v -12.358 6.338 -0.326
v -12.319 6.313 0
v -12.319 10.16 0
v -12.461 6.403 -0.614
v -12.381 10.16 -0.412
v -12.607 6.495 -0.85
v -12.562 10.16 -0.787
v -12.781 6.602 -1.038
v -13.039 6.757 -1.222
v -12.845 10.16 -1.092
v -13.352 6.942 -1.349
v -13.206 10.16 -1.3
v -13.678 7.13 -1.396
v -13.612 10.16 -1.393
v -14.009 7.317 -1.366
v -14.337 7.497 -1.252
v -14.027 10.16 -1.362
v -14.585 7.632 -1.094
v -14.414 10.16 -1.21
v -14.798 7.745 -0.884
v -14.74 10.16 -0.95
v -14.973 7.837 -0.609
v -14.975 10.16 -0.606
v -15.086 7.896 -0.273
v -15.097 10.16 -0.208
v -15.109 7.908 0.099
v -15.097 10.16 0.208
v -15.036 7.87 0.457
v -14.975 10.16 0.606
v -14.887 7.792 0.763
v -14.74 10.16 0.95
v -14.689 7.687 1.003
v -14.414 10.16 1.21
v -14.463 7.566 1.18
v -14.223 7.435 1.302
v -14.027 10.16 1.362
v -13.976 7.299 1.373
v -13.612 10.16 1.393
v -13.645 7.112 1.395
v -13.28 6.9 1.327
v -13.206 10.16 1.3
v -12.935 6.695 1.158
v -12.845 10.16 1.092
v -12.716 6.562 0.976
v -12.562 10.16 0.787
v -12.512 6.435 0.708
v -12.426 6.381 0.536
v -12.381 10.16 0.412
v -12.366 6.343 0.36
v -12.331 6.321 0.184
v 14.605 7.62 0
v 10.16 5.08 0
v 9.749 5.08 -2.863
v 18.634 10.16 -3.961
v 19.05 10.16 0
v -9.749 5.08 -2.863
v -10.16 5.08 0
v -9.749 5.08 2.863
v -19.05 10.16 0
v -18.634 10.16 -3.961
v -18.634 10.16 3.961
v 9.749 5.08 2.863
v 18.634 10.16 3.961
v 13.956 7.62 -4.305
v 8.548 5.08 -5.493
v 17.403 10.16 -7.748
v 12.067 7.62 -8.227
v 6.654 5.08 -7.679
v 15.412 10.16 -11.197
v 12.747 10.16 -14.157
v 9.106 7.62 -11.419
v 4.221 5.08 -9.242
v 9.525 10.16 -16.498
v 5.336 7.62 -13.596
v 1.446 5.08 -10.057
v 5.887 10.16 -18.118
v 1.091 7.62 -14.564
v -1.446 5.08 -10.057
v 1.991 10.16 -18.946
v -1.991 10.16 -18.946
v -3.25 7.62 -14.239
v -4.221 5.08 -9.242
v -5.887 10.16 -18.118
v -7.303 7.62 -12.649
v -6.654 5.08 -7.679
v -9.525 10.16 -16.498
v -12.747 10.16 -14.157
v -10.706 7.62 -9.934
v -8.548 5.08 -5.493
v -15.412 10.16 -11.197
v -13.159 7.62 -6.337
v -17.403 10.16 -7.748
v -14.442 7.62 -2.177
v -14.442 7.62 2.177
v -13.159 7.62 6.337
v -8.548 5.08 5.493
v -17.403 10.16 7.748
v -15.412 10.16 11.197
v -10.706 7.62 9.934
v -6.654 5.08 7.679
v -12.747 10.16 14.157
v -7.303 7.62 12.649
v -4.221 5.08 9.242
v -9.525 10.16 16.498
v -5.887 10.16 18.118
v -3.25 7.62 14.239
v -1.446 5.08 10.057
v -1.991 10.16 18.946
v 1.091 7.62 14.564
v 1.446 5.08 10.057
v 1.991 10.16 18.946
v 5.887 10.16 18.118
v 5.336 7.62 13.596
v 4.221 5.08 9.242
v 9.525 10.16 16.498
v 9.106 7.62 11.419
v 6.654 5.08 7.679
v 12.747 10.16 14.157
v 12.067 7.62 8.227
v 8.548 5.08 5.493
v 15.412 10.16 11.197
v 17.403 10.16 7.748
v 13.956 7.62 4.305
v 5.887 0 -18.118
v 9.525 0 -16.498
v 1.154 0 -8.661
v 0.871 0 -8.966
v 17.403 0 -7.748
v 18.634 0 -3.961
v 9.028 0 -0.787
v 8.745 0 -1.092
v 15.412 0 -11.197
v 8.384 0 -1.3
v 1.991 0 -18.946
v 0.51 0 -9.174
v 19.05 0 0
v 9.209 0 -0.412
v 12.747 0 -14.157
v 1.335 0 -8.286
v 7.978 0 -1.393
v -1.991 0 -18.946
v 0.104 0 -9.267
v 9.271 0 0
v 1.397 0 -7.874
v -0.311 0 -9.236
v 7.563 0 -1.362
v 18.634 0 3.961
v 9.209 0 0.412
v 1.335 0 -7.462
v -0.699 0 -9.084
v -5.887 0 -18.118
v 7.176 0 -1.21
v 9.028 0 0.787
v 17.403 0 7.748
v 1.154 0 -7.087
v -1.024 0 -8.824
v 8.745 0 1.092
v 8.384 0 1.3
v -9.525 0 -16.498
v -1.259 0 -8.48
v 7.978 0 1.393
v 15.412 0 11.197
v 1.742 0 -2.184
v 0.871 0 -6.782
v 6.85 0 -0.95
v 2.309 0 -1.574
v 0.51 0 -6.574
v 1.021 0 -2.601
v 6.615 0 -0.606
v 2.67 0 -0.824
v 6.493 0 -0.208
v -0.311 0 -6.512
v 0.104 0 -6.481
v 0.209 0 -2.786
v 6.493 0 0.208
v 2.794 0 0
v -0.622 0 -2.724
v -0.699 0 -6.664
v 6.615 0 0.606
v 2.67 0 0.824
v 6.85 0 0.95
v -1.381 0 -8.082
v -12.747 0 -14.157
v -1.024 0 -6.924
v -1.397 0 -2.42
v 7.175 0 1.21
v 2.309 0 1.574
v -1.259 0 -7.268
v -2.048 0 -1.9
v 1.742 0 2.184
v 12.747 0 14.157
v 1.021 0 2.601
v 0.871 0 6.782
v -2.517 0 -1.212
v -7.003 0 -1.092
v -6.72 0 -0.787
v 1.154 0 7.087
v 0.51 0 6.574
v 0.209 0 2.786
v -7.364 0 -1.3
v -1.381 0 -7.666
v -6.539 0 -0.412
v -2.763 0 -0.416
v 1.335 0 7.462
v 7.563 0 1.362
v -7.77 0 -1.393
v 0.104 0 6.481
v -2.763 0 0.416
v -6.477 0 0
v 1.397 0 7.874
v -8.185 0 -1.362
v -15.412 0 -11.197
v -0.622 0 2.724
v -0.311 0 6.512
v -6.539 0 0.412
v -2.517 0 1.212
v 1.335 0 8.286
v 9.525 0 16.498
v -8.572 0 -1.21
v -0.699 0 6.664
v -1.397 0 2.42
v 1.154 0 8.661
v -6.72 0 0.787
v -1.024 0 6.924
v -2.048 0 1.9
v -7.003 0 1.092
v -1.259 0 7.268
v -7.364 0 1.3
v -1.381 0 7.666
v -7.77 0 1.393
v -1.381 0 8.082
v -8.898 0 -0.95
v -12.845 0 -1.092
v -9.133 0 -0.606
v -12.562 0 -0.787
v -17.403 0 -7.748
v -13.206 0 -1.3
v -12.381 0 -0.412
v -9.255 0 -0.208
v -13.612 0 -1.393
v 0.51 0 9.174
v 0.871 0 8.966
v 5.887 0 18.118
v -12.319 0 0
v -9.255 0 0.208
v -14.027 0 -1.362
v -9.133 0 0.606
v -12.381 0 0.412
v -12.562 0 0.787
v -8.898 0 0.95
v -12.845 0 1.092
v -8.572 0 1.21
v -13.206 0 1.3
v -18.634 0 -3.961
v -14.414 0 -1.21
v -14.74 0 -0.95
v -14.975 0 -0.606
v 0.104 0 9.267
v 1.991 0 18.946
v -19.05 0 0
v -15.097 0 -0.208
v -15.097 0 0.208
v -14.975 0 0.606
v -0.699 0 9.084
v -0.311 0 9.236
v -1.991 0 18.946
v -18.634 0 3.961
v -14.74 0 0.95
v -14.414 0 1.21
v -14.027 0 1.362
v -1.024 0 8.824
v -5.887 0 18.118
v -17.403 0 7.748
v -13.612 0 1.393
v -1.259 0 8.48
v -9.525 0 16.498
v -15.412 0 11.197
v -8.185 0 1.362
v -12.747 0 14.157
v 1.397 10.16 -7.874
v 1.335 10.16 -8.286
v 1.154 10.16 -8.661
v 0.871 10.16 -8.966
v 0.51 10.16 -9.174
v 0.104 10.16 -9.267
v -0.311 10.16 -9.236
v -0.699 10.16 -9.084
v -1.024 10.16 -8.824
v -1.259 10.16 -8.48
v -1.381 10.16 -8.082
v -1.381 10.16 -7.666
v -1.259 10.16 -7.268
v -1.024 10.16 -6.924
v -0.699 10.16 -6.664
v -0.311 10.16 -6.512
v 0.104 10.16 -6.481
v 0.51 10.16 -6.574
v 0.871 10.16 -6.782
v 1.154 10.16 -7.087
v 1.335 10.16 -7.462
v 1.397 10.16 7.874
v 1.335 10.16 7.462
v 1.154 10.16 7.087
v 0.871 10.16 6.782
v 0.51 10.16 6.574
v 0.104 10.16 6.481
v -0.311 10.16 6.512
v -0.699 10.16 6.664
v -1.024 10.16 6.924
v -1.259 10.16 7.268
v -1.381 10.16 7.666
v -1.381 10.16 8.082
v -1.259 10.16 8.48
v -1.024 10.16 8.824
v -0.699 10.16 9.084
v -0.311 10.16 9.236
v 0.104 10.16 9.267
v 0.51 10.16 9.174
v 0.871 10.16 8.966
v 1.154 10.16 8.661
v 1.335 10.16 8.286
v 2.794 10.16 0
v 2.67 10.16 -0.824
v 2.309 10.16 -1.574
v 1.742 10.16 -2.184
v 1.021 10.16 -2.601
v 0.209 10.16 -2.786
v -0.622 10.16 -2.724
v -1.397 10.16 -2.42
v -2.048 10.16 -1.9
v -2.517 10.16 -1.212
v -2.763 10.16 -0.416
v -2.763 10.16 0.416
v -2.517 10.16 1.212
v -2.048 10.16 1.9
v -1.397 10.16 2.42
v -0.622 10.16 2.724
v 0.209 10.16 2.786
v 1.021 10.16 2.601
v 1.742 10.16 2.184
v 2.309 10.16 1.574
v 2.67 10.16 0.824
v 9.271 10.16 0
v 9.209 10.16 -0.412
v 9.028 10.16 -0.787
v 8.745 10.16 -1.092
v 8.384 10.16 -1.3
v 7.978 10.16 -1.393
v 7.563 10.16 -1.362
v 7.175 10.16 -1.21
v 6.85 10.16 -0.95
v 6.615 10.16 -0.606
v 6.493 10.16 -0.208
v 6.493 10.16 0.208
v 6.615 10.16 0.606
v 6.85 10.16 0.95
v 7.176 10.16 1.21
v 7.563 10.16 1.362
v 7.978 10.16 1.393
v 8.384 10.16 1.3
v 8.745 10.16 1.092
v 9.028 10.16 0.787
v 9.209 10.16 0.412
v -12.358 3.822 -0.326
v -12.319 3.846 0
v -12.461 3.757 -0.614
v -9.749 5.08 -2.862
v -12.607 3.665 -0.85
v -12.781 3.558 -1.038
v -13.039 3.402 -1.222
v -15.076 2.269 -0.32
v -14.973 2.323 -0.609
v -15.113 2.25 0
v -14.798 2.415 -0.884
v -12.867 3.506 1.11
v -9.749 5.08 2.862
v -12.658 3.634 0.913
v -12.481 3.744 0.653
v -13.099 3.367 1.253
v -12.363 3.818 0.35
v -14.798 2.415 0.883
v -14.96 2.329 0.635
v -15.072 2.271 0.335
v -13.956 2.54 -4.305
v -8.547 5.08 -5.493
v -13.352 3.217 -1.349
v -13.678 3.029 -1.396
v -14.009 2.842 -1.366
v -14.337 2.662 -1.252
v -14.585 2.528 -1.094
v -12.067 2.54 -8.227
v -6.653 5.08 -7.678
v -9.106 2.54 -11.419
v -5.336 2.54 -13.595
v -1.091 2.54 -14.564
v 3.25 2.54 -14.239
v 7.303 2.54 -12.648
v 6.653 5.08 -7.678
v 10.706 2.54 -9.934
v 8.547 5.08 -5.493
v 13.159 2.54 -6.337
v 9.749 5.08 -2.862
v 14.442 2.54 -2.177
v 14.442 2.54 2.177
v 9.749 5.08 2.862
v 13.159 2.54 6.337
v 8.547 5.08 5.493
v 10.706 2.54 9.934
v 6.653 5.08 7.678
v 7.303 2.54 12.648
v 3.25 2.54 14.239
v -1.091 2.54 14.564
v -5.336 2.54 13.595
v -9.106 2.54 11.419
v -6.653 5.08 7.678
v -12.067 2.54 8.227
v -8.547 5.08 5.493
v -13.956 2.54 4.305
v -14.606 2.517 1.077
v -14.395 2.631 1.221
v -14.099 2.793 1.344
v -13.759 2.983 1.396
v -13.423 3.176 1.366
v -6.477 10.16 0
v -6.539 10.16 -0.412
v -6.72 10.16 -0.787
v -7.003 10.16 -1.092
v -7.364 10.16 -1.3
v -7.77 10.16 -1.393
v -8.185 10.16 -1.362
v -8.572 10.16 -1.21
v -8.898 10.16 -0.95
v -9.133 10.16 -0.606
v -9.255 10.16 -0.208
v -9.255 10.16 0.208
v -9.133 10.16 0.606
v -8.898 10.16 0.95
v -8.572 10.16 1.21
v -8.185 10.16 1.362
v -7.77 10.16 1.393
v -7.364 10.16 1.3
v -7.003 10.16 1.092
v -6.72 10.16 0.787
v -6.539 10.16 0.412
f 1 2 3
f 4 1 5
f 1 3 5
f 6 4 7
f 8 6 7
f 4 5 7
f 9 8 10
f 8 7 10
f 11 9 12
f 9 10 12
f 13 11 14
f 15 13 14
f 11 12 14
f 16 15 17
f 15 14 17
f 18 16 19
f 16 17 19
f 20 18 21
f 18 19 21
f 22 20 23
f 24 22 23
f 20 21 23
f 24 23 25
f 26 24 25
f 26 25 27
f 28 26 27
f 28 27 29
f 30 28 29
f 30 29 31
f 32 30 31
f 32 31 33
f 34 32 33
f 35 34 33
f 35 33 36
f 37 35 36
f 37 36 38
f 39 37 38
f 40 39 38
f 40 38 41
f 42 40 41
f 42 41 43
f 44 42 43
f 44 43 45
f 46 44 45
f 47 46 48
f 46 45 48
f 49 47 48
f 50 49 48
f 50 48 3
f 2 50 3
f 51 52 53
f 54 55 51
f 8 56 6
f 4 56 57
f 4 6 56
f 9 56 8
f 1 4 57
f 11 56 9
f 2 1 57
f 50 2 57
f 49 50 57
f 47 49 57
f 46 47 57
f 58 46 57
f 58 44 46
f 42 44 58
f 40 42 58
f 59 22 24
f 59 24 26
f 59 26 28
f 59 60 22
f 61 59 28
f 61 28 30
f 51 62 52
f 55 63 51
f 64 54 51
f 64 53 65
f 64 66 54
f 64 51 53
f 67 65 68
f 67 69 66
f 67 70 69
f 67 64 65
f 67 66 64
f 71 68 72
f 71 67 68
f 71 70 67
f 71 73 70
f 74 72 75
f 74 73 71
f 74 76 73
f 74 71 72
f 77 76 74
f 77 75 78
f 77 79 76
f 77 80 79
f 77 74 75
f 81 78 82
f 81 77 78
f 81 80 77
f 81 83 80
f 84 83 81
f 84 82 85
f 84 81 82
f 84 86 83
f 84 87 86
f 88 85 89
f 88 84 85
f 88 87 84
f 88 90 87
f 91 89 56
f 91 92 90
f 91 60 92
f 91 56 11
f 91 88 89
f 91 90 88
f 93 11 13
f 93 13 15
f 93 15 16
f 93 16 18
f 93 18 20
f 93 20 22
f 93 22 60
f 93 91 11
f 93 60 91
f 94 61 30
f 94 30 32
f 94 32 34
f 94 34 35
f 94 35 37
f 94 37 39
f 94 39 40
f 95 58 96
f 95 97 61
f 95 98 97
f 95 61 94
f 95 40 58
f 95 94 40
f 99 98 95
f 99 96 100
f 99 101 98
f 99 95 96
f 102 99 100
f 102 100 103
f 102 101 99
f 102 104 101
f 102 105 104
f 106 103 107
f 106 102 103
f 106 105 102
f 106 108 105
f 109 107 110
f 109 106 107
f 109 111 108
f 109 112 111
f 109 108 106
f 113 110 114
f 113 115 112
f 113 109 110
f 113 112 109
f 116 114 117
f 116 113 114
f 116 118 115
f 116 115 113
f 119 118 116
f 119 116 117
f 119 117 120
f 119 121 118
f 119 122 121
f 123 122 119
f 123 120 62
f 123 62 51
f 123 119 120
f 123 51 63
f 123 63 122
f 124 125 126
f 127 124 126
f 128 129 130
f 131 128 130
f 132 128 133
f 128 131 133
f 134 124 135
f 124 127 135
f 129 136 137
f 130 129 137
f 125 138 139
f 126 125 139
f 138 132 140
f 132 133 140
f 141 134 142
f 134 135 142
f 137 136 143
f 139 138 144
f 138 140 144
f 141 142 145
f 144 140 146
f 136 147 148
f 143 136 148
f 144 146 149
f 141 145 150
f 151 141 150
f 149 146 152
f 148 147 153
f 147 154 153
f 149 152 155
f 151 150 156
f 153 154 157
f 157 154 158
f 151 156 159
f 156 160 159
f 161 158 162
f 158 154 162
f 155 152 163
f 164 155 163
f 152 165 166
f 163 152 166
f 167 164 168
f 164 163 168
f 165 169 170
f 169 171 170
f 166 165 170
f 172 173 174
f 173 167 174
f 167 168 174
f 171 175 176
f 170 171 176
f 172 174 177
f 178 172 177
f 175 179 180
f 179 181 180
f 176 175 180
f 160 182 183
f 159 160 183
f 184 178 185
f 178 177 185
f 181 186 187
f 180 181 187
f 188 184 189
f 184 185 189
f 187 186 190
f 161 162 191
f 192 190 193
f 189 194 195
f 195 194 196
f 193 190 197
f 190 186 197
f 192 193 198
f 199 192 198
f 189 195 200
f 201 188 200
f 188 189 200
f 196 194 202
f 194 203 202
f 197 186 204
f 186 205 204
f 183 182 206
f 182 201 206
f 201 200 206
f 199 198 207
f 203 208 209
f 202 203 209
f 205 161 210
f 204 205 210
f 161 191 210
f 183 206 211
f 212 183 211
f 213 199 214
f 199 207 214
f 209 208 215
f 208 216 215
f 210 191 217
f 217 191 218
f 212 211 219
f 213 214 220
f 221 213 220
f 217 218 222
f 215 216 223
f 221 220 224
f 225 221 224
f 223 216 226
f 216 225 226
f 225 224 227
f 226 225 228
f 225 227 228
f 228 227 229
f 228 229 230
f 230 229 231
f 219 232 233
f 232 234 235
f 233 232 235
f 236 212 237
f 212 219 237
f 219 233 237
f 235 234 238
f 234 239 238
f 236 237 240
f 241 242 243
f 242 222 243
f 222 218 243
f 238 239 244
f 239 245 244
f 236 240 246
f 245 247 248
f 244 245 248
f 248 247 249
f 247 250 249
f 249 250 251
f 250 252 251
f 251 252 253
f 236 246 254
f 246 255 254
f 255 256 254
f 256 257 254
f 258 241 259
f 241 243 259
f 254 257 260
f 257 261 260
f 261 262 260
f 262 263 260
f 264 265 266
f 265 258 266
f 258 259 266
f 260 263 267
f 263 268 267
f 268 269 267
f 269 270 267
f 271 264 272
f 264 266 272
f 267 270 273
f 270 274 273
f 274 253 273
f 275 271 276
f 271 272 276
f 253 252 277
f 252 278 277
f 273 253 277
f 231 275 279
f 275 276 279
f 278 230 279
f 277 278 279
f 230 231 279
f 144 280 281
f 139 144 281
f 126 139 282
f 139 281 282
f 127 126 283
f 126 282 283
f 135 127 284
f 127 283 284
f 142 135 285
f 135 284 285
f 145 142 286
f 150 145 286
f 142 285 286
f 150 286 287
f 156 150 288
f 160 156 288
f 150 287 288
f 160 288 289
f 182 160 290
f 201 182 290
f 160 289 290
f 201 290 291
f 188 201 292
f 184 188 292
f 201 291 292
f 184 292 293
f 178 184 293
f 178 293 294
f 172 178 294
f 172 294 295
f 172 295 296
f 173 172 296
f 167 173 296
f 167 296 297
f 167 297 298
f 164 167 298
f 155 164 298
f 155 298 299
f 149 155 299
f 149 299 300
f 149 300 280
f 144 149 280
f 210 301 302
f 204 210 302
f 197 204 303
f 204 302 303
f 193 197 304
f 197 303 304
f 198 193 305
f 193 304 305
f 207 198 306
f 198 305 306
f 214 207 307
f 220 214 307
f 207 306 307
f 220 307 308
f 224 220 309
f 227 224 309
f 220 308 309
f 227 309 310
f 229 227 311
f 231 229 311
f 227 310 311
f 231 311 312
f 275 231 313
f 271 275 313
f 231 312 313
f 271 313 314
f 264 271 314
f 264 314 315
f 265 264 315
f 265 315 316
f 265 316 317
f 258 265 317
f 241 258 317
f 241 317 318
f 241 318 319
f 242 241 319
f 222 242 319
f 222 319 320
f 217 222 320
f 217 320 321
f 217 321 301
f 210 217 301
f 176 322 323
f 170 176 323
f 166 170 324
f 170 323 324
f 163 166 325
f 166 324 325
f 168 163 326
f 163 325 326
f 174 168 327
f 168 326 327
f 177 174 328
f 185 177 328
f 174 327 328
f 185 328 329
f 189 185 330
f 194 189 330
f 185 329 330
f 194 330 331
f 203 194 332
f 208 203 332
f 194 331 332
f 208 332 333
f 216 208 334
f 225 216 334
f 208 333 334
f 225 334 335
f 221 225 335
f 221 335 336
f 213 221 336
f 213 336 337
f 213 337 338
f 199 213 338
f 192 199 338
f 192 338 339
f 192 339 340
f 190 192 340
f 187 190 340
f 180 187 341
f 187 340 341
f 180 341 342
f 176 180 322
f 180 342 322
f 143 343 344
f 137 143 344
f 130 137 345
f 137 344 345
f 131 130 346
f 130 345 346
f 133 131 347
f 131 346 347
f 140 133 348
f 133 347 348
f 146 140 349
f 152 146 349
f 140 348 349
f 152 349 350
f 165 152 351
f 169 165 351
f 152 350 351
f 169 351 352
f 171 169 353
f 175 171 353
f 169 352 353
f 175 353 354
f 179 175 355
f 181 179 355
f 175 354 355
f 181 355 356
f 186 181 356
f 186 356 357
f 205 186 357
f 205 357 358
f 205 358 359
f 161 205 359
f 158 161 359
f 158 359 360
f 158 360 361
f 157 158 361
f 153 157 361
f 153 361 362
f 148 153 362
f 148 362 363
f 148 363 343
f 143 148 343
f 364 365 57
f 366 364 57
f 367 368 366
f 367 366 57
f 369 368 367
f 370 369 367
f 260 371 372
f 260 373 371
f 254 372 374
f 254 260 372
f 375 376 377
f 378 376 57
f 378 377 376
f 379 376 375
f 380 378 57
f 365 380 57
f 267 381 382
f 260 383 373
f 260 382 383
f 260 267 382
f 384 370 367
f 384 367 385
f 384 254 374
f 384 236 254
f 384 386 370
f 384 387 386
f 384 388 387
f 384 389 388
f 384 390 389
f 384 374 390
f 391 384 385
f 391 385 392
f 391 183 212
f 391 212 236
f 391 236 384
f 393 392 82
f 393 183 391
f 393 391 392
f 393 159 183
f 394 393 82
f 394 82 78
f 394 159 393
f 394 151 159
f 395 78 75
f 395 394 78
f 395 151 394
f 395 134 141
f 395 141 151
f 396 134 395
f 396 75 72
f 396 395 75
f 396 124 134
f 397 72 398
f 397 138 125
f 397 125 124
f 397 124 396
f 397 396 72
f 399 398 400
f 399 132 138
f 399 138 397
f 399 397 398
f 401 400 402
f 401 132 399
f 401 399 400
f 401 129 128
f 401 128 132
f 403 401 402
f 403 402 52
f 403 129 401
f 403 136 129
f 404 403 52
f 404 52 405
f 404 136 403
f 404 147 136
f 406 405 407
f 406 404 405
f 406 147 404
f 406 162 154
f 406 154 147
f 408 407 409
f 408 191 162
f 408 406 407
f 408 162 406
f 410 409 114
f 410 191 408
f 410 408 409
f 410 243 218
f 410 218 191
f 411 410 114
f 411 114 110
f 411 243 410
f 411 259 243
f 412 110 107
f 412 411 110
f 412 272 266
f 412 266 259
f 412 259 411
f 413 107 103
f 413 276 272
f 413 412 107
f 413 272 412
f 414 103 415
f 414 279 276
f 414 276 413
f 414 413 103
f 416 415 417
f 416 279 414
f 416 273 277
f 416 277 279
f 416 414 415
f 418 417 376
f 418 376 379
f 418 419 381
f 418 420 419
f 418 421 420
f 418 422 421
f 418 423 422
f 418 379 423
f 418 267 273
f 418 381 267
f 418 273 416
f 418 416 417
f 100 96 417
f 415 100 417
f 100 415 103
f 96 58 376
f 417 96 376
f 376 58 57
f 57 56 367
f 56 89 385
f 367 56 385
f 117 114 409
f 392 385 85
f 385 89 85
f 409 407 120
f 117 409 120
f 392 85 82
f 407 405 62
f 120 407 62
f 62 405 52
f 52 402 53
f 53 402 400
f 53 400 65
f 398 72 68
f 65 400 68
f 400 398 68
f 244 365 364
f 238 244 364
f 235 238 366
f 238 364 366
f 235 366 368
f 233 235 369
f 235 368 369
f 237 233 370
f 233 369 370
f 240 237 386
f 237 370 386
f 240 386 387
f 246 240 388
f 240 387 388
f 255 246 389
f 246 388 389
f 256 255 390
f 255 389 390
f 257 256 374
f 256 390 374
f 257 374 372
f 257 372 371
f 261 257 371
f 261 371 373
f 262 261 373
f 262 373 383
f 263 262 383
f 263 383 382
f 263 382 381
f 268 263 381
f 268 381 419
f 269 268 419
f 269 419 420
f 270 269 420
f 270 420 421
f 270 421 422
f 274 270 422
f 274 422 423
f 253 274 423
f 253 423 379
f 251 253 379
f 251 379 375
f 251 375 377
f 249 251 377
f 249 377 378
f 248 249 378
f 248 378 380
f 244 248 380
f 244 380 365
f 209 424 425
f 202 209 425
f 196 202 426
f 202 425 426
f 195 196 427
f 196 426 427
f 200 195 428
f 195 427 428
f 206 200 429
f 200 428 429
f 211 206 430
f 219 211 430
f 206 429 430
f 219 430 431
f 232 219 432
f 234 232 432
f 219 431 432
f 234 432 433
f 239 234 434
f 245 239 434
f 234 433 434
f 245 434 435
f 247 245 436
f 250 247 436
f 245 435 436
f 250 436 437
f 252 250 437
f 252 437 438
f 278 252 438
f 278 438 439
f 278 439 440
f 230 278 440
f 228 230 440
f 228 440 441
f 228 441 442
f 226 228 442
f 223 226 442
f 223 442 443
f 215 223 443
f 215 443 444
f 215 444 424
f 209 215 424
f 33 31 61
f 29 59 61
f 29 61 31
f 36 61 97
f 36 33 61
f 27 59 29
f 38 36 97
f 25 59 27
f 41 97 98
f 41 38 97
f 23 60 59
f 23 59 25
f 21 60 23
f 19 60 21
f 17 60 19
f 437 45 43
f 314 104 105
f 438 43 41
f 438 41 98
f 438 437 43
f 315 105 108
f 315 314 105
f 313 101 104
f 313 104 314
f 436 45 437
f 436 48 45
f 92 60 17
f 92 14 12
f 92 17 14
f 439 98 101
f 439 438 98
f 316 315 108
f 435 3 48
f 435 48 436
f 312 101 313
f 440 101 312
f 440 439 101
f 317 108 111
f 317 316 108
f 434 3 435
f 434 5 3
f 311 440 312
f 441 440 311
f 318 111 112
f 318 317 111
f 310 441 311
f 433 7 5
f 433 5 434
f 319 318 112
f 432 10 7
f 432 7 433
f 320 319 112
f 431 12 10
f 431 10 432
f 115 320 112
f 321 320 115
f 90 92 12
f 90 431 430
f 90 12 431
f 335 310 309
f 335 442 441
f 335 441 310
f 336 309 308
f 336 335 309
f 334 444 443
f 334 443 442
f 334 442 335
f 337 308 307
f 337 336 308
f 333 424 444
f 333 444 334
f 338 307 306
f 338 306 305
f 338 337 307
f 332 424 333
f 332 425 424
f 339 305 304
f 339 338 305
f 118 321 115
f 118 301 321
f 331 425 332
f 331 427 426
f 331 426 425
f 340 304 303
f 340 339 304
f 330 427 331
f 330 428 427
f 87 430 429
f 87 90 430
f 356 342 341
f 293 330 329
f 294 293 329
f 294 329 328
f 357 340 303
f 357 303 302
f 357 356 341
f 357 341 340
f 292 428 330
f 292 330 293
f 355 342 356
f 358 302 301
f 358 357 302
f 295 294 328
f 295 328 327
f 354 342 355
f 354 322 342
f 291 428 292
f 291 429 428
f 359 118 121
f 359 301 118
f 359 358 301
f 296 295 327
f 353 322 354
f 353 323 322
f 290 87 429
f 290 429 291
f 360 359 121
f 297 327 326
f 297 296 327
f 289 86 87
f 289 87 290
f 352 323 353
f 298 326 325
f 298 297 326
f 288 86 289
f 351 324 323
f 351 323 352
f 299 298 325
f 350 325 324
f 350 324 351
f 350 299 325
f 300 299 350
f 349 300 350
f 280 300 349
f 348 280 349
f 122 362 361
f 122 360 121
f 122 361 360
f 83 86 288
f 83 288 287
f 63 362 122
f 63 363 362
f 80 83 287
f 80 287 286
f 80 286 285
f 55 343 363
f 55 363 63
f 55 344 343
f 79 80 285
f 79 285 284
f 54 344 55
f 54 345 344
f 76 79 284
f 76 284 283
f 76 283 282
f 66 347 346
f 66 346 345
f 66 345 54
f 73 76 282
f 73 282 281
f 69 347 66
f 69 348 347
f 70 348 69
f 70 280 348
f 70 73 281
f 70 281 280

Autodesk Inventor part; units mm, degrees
ref_plane "YZ Plane" through (0, 0, 0) normal (1, 0, 0) x (0, 1, 0)
ref_plane "XZ Plane" through (0, 0, 0) normal (0, 1, 0) x (-1, 0, 0)
ref_plane "XY Plane" through (0, 0, 0) normal (0, 0, 1) x (1, 0, 0)
sketch "Sketch1" plane through (0, 0, 0) normal (0, 1, 0) x (-1, 0, 0)
  circle A0 centre (0, 0) radius 19.05
  dimension "d0" = 38.1
extrude "Extrusion1" add sketch "Sketch1" along normal blind 5.08
chamfer "Chamfer1" distance 8.89 distance2 5.08 1 edges at (19.05, 5.08, 0) measured on face at (-1.662, 5.08, -1.5197)
sketch "Sketch2" plane through (0, 5.08, 0) normal (0, 1, 0) x (1, 0, 0)
  circle A0 centre (0, 0) radius 19.05
extrude "Extrusion2" add sketch "Sketch2" along normal blind 5.08
chamfer "Chamfer2" distance 8.89 distance2 5.08 1 edges at (-19.05, 5.08, 0) measured on face at (15.8038, 5.08, 2.3301)
sketch "Sketch4" plane through (0, 10.16, 0) normal (0, 1, 0) x (1, 0, 0)
  circle A0 centre (0, 0) radius 2.794
  line L0 (0, 0) -> (-7.874, 0)
  line L1 (-7.874, 0) -> (-13.716, 0)
  line L2 (0, 0) -> (0, 7.874)
  line L3 (0, 0) -> (7.874, 0)
  line L4 (0, 0) -> (0, -7.874)
  circle A1 centre (0, -7.874) radius 1.397
  circle A2 centre (7.874, 0) radius 1.397
  circle A3 centre (0, 7.874) radius 1.397
  circle A4 centre (-7.874, 0) radius 1.397
  circle A5 centre (-13.716, 0) radius 1.397
  dimension "d28" = 5.588
  dimension "d29" = 7.874
  dimension "d30" = 5.842
  dimension "d31" = 7.874
  dimension "d32" = 7.874
  dimension "d33" = 7.874
  dimension "d34" = 2.794
  dimension "d35" = 2.794
  dimension "d36" = 2.794
  dimension "d37" = 2.794
  dimension "d38" = 2.794
  dimension "d15" = 7.874
  dimension "d16" = 5.842
  dimension "d17" = 5.588
  dimension "d18" = 2.794
  dimension "d19" = 2.794
  dimension "d20" = 7.874
  dimension "d21" = 7.874
  dimension "d22" = 7.874
  dimension "d23" = 2.794
  dimension "d24" = 2.794
  dimension "d25" = 2.794
extrude "Extrusion3" cut sketch "Sketch4" against normal blind 10.16
properties part number "LittleBigWheel v3"
